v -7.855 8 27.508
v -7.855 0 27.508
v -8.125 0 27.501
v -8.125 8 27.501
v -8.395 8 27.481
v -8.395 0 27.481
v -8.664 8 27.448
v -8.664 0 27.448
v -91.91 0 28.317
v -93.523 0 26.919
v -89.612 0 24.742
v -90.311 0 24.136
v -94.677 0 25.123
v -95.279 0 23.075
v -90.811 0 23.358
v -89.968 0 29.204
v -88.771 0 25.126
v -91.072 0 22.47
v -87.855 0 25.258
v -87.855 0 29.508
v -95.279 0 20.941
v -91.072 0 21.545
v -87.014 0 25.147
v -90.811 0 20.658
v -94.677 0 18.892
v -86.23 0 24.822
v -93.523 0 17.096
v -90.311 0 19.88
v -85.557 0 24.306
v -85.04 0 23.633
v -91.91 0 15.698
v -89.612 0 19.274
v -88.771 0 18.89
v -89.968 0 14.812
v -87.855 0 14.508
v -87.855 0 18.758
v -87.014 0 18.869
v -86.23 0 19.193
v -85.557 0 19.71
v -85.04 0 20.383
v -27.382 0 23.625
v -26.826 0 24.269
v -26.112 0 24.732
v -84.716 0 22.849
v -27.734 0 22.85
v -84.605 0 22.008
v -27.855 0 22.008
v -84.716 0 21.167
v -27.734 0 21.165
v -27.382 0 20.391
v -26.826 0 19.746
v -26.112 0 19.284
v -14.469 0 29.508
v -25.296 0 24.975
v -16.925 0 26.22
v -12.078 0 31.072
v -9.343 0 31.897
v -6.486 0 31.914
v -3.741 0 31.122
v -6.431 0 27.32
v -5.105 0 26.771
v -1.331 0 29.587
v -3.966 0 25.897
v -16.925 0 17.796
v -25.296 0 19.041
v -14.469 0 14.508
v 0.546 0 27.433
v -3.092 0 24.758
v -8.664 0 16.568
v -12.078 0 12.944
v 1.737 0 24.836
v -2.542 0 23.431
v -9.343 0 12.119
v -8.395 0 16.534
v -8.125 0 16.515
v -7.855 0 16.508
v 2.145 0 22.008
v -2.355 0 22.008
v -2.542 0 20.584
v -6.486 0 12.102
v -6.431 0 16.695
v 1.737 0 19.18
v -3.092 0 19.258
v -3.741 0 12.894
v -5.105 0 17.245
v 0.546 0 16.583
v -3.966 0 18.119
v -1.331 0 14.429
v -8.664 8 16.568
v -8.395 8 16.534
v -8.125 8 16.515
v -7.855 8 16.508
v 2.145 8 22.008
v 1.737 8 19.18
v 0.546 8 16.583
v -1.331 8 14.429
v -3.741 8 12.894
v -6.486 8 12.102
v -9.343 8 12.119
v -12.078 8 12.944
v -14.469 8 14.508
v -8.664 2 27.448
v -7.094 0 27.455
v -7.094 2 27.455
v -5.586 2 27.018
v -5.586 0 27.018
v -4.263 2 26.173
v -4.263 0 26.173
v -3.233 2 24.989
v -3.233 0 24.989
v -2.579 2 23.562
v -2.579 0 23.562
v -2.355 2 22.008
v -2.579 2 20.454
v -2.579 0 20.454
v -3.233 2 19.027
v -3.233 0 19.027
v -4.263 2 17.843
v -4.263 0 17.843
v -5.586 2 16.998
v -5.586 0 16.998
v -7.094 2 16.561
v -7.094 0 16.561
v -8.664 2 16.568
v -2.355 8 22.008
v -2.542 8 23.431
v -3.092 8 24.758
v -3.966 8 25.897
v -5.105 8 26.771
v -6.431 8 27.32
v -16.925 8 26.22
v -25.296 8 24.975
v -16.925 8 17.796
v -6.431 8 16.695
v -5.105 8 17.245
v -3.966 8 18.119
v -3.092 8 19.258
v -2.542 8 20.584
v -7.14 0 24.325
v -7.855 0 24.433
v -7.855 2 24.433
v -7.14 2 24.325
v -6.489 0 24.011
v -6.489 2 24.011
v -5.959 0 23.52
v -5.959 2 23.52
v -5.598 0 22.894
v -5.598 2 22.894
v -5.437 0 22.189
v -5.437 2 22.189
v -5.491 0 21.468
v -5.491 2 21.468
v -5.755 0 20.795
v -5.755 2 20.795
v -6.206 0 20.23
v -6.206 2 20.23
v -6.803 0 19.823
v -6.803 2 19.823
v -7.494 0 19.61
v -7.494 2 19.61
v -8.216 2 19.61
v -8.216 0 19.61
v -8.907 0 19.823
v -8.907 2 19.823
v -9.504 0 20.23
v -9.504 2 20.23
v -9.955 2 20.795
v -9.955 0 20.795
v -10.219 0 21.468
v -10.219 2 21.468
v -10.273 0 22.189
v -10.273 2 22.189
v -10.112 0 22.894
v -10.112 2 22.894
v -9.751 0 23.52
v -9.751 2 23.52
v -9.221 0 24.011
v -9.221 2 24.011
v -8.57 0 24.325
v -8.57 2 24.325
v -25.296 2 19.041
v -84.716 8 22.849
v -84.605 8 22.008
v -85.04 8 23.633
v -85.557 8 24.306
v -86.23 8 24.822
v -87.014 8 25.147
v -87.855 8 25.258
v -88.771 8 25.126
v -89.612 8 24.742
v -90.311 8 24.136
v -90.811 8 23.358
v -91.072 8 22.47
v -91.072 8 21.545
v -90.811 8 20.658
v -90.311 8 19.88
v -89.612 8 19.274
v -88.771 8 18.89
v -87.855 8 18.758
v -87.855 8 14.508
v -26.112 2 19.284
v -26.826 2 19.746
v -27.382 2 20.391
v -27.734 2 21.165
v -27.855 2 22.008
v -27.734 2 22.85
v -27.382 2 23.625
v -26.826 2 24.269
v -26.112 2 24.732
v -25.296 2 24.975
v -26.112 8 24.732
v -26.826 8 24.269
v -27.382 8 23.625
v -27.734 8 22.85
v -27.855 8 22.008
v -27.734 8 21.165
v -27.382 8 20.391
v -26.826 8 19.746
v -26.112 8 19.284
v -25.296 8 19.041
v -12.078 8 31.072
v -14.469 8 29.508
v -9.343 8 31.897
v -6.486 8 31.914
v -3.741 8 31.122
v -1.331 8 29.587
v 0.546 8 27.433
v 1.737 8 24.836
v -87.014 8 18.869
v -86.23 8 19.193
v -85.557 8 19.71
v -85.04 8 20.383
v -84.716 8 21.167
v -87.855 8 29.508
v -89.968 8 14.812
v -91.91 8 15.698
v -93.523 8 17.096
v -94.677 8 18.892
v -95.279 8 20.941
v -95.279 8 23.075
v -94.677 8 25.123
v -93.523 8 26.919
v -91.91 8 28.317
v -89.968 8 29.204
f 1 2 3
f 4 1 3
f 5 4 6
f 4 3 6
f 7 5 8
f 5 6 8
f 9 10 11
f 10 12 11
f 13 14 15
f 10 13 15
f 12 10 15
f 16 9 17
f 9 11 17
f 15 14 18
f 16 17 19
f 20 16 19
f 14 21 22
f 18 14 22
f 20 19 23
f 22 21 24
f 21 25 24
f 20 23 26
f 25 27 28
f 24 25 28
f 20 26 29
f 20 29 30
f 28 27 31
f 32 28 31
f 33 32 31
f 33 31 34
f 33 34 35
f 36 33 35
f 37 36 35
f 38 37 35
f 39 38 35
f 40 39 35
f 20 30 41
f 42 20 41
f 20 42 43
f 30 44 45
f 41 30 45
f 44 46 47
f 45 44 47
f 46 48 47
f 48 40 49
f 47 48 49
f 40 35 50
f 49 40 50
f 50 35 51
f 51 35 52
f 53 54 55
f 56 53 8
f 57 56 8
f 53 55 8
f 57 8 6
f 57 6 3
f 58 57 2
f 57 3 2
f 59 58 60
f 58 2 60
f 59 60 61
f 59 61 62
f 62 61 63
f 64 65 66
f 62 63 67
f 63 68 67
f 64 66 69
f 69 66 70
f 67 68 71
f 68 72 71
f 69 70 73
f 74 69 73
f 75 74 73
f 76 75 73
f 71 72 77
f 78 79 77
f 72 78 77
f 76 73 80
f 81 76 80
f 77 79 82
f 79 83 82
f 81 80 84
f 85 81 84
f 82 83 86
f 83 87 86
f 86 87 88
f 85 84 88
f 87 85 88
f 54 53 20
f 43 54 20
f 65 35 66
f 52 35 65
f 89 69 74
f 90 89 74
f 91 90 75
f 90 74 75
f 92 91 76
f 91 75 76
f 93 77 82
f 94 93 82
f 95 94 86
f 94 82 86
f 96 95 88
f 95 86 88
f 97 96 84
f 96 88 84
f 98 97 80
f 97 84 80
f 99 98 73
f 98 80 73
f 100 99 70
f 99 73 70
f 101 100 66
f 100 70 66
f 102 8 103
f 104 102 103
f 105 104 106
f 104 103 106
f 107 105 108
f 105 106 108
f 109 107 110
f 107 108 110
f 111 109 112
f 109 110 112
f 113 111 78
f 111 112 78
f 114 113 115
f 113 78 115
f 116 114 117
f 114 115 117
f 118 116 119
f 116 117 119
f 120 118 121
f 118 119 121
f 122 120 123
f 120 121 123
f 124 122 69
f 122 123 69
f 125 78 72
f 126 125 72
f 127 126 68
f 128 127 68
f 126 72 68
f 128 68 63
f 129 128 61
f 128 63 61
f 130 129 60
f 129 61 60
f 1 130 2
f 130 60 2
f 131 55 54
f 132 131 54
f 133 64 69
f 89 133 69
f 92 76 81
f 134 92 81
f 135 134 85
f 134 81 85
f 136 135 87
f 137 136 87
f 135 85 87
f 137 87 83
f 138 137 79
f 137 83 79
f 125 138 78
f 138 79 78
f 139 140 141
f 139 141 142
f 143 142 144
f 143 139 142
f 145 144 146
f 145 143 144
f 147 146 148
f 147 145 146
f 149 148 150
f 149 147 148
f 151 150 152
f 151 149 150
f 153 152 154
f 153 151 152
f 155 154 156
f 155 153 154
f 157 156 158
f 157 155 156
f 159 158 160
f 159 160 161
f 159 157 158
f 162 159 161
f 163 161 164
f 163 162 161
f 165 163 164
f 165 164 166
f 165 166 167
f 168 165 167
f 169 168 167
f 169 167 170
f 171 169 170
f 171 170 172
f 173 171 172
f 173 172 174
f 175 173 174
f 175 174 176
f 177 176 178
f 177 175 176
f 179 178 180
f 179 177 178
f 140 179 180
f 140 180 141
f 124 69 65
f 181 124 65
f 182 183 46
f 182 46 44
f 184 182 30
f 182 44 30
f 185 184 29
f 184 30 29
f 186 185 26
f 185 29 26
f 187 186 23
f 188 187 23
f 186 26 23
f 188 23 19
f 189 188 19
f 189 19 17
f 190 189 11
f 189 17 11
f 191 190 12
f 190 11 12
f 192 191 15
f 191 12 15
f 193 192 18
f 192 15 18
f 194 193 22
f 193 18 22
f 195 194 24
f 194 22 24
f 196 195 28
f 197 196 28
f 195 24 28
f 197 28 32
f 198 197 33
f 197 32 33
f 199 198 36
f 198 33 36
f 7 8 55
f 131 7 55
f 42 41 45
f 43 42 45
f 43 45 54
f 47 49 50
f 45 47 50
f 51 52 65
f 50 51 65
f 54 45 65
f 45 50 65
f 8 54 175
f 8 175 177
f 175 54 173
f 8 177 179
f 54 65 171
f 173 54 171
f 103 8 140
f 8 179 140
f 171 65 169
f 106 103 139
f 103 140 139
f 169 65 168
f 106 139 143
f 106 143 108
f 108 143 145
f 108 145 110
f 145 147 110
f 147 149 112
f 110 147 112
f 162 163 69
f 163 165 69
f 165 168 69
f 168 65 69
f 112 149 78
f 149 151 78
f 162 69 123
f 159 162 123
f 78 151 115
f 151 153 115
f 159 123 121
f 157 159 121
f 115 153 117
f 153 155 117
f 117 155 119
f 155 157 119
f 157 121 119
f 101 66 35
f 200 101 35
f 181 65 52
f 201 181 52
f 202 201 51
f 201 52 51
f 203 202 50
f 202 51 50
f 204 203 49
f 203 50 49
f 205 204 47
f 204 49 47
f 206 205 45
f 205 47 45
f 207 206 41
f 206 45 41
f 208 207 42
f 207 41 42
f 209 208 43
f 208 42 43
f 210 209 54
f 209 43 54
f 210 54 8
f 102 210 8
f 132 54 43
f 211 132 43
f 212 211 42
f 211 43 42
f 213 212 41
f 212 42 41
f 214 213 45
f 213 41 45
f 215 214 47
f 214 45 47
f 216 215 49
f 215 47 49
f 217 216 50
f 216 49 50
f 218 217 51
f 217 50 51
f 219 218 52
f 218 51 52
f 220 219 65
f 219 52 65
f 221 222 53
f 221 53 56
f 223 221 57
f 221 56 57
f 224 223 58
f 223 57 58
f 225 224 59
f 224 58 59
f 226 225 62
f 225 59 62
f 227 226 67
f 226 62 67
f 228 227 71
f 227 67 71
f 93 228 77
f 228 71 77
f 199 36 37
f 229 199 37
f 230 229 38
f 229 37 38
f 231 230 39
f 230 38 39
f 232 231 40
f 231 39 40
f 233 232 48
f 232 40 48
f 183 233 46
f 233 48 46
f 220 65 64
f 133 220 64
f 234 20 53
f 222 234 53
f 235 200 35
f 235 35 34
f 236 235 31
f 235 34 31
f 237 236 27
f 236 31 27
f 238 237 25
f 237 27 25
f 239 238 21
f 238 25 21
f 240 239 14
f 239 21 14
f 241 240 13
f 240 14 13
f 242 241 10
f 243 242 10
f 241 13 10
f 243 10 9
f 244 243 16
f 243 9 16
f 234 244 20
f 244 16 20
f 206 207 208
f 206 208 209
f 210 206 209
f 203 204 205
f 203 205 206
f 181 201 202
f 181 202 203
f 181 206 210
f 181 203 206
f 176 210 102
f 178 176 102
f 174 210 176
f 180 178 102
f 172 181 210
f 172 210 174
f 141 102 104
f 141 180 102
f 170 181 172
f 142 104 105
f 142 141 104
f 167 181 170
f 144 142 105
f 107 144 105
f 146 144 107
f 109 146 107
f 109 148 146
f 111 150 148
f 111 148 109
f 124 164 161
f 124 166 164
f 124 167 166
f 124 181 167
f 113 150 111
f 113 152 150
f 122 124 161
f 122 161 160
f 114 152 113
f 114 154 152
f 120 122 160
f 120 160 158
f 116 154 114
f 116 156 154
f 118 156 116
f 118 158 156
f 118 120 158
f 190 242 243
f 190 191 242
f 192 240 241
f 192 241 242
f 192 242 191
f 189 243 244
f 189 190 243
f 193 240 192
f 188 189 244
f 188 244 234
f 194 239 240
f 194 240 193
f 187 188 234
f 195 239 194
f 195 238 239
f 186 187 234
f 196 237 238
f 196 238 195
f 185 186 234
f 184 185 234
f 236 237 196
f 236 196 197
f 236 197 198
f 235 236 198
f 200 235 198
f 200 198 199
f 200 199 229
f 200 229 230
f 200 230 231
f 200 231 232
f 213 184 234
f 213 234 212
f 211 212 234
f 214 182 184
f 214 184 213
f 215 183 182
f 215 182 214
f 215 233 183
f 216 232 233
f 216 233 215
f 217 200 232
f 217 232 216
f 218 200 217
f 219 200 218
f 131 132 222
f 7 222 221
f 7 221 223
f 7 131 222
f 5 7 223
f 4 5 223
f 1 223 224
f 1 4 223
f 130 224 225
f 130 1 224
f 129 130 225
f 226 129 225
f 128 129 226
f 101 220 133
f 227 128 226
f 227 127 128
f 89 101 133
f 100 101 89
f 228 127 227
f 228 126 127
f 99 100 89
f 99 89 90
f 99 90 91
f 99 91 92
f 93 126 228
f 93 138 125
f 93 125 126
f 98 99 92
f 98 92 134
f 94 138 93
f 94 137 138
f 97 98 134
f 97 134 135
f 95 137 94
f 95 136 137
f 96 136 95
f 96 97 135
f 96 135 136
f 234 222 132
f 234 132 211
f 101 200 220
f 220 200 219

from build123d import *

# Parameters (mm, degrees)
SKETCH3_R           = 3.25
BOSS_EXTRUDE4_DEPTH = 8
SKETCH3_24_R        = 2.424842227
BOSS_EXTRUDE5_DEPTH = 2


with BuildPart() as part:
    # Sketch3 → Boss-Extrude4 (new body)
    with BuildSketch(Plane(origin=(0, 0, 0), x_dir=(1, 0, 0), z_dir=(0, 1, 0))):
        with BuildLine():
            Line((-87.854933508, -29.507885268), (-14.469311786, -29.507885268))
            ThreePointArc((-14.469311786, -29.507885268), (2.145066492, -22.007885268), (-14.469311786, -14.507885268))
            Line((-14.469311786, -14.507885268), (-87.854933508, -14.507885268))
            ThreePointArc((-87.854933508, -14.507885268), (-95.354933508, -22.007885268), (-87.854933508, -29.507885268))
        make_face()
        with BuildLine():
            ThreePointArc((-8.663757037, -16.567682652), (-2.354933508, -22.007885268), (-8.663757037, -27.448087883))
            Line((-8.663757037, -27.448087883), (-25.296109978, -24.975268512))
            ThreePointArc((-25.296109978, -24.975268512), (-27.854933508, -22.007885268), (-25.296109978, -19.040502023))
            Line((-25.296109978, -19.040502023), (-8.663757037, -16.567682652))
        make_face(mode=Mode.SUBTRACT)
        with Locations((-87.854933508, -22.007885268)):
            Circle(SKETCH3_R, mode=Mode.SUBTRACT)
    extrude(amount=BOSS_EXTRUDE4_DEPTH)


with BuildPart() as body_2:
    # Sketch3<24> → Boss-Extrude5 (new body)
    with BuildSketch(Plane(origin=(0, 0, 0), x_dir=(1, 0, 0), z_dir=(0, 1, 0))):
        with BuildLine():
            ThreePointArc((-8.663757037, -27.448087883), (-2.354933508, -22.007885268), (-8.663757037, -16.567682652))
            Line((-8.663757037, -16.567682652), (-25.296109978, -19.040502023))
            ThreePointArc((-25.296109978, -19.040502023), (-27.854933508, -22.007885268), (-25.296109978, -24.975268512))
            Line((-25.296109978, -24.975268512), (-8.663757037, -27.448087883))
        make_face()
        with Locations((-7.854933508, -22.007885268)):
            Circle(SKETCH3_24_R, mode=Mode.SUBTRACT)
    extrude(amount=BOSS_EXTRUDE5_DEPTH)


solid = Compound([part.part, body_2.part])
